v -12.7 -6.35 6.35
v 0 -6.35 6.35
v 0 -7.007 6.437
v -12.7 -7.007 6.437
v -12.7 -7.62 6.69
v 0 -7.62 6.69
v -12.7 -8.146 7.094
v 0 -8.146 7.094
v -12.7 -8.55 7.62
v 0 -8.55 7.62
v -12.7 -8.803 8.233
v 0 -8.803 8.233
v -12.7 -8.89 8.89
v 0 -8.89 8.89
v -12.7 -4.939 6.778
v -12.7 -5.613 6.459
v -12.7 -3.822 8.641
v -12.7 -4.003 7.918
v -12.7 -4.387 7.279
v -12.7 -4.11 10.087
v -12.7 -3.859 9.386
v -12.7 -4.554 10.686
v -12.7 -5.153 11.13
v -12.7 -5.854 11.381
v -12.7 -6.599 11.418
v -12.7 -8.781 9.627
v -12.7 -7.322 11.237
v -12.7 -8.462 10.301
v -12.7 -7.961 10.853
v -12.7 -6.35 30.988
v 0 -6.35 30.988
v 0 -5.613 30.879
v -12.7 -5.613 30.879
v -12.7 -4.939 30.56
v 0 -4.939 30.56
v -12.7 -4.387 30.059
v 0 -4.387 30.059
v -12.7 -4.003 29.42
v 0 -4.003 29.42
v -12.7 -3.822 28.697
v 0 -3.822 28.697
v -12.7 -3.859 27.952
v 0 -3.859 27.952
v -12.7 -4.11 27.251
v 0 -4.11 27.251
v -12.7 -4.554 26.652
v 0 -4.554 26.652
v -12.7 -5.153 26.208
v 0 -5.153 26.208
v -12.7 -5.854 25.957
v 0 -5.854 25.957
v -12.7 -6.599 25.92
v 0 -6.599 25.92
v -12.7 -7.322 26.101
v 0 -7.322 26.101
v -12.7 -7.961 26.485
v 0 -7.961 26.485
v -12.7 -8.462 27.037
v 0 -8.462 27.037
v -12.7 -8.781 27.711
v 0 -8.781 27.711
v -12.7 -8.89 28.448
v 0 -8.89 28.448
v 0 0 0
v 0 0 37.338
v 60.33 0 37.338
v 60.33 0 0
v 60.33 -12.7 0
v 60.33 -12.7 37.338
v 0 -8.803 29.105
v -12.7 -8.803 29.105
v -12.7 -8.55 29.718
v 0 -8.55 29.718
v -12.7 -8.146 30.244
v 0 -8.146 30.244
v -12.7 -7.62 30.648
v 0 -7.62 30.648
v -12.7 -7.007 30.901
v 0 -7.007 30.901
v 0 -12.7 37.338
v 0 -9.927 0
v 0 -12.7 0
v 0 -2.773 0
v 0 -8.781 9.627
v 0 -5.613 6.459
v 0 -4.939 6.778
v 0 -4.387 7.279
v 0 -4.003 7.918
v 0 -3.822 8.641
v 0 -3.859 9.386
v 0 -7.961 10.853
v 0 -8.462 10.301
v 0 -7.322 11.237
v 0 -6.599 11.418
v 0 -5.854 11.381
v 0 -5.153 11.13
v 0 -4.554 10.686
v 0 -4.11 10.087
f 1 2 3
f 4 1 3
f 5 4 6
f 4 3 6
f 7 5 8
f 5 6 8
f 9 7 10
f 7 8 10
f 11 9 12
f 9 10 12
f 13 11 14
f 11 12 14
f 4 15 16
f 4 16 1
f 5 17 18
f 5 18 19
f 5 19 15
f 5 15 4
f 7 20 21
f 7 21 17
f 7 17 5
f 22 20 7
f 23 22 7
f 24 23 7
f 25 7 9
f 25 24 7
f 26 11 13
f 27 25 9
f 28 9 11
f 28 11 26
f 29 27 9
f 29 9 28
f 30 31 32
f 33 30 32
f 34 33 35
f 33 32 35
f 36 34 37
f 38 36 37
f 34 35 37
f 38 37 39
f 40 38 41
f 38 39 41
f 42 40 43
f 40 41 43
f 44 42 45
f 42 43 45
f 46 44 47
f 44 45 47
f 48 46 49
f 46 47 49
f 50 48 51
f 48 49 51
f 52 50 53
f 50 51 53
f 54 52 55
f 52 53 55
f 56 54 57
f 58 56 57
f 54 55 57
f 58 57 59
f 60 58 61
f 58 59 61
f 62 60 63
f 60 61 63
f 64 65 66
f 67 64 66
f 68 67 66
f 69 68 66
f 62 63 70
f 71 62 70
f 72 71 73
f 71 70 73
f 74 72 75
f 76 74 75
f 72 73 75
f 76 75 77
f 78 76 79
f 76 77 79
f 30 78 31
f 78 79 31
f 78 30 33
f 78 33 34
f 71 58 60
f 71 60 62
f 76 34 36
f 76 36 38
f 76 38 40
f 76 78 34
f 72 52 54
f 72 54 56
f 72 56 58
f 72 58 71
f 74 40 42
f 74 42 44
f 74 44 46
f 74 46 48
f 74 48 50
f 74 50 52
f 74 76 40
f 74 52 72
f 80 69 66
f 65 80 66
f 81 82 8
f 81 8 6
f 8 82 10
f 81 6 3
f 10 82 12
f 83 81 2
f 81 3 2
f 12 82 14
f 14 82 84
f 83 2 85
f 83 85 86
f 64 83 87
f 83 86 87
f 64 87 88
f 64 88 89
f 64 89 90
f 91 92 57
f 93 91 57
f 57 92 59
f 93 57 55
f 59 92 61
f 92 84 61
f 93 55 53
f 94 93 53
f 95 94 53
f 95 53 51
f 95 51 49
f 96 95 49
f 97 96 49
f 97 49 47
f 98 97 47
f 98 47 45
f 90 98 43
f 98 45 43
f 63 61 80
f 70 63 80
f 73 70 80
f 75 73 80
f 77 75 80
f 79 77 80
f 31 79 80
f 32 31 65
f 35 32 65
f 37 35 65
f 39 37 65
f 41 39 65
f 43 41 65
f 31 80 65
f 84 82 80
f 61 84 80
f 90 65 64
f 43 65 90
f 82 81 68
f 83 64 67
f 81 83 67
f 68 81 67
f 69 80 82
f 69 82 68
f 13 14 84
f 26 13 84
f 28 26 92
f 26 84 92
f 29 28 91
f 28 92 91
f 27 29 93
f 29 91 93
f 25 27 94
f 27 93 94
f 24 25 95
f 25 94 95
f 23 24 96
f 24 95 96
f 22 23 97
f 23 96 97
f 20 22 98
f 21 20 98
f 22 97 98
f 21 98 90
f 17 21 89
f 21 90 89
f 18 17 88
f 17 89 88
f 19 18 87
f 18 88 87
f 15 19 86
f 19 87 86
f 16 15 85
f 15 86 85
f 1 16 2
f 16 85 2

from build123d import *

# Parameters (mm, degrees)
F0_W      = 60.33
F0_H      = 38.1
F1_DEPTH  = 12.7
F3_DEPTH  = 38.1
F4_W      = 11.2605243921
F4_H      = 14.8357795551
F5_DEPTH  = 3.175
F6_W      = 12.7
F6_H      = 0.254
F7_DEPTH  = 101.6
F8_W      = 7.62
F8_H      = 0.6586039143
F11_W     = 5.8358858012
F11_H     = 2.5163960857
F12_DEPTH = 7.62
F13_W     = 12.7
F13_H     = 0.508
F14_DEPTH = 101.6
F16_DEPTH = 17.78
F18_DEPTH = 25.4
F20_DEPTH = 12.7


with BuildPart() as f1:
    # F0 (on Front) → F1 (new body)
    with BuildSketch(Plane.XZ):
        with Locations((30.165, 19.05)):
            Rectangle(F0_W, F0_H)
    extrude(amount=F1_DEPTH)

    # F2 (on face) → F3 (join)
    with BuildSketch(Plane.XY.offset(38.1)):
        Polygon((0, -2.7734531851), (-7.62, 0), (-7.62, -12.7), (0, -9.9265468149), align=None)
    extrude(amount=-F3_DEPTH)

    # F4 (on face) → F5 (cut)
    with BuildSketch(Plane(origin=(0, 0, 0), x_dir=(1, 0, 0), z_dir=(0, 0, -1))):
        with Locations((-5.6302621961, 7.4178897776)):
            Rectangle(F4_W, F4_H)
    extrude(amount=-F5_DEPTH, mode=Mode.SUBTRACT)

    # F6 (on face) → F7 (cut)
    with BuildSketch(Plane.YZ.offset(60.33)):
        with Locations((-6.35, 37.973)):
            Rectangle(F6_W, F6_H)
    extrude(amount=-F7_DEPTH, mode=Mode.SUBTRACT)

    # F10: sweep along a path in F9
    with BuildLine(Plane(origin=(0, 0, 0), x_dir=(0, -1, 0), z_dir=(-1, 0, 0))) as f10_path:
        Line((2.7734531851, 3.175), (2.7734531851, 0))
        Line((2.7734531851, 0), (9.9265468149, 0))
        Line((9.9265468149, 0), (9.9265468149, 3.175))
    # F8 (on face) → F10 (sweep)
    with BuildSketch(Plane(origin=(0, 0, 3.175), x_dir=(1, 0, 0), z_dir=(0, 0, -1))):
        with Locations((-3.81, 3.1027551423)):
            Rectangle(F8_W, F8_H)
        Polygon((-7.62, 0), (0, 2.7734531851), (-7.62, 2.7734531851), align=None)
    sweep(path=f10_path.line, transition=Transition.RIGHT)

    # F11 (on face) → F12 (join)
    with BuildSketch(Plane(origin=(-7.62, 0, 0), x_dir=(0, -1, 0), z_dir=(-1, 0, 0))):
        with Locations((6.35, 1.9168019572)):
            Rectangle(F11_W, F11_H)
    extrude(amount=-F12_DEPTH)

    # F13 (on face) → F14 (cut)
    with BuildSketch(Plane.YZ.offset(60.33)):
        with Locations((-6.35, 37.592)):
            Rectangle(F13_W, F13_H)
    extrude(amount=-F14_DEPTH, mode=Mode.SUBTRACT)

    # F15 (on face) → F16 (cut)
    with BuildSketch(Plane.XY.offset(37.338)):
        Polygon((0, -2.7734531851), (-7.62, 0), (-7.62, -12.7), (0, -9.9265468149), align=None)
    extrude(amount=-F16_DEPTH, mode=Mode.SUBTRACT)

    # F17 (on face) → F18 (cut)
    with BuildSketch(Plane.XY.offset(19.558)):
        Polygon((-7.62, 0), (-7.62, -12.7), (0, -9.9265468149), (0, -2.7734531851), align=None)
    extrude(amount=-F18_DEPTH, mode=Mode.SUBTRACT)

    # F19 (on face) → F20 (join)
    with BuildSketch(Plane(origin=(0, 0, 0), x_dir=(0, -1, 0), z_dir=(-1, 0, 0))):
        with BuildLine():
            ThreePointArc((8.89, 8.89), (4.5539487758, 10.6860512242), (6.35, 6.35))
            ThreePointArc((6.35, 6.35), (8.1460512242, 7.0939487758), (8.89, 8.89))
        make_face()
        with BuildLine():
            ThreePointArc((8.89, 28.448), (8.1460512242, 30.2440512242), (6.35, 30.988))
            ThreePointArc((6.35, 30.988), (4.5539487758, 26.6519487758), (8.89, 28.448))
        make_face()
    extrude(amount=F20_DEPTH)


solid = f1.part
